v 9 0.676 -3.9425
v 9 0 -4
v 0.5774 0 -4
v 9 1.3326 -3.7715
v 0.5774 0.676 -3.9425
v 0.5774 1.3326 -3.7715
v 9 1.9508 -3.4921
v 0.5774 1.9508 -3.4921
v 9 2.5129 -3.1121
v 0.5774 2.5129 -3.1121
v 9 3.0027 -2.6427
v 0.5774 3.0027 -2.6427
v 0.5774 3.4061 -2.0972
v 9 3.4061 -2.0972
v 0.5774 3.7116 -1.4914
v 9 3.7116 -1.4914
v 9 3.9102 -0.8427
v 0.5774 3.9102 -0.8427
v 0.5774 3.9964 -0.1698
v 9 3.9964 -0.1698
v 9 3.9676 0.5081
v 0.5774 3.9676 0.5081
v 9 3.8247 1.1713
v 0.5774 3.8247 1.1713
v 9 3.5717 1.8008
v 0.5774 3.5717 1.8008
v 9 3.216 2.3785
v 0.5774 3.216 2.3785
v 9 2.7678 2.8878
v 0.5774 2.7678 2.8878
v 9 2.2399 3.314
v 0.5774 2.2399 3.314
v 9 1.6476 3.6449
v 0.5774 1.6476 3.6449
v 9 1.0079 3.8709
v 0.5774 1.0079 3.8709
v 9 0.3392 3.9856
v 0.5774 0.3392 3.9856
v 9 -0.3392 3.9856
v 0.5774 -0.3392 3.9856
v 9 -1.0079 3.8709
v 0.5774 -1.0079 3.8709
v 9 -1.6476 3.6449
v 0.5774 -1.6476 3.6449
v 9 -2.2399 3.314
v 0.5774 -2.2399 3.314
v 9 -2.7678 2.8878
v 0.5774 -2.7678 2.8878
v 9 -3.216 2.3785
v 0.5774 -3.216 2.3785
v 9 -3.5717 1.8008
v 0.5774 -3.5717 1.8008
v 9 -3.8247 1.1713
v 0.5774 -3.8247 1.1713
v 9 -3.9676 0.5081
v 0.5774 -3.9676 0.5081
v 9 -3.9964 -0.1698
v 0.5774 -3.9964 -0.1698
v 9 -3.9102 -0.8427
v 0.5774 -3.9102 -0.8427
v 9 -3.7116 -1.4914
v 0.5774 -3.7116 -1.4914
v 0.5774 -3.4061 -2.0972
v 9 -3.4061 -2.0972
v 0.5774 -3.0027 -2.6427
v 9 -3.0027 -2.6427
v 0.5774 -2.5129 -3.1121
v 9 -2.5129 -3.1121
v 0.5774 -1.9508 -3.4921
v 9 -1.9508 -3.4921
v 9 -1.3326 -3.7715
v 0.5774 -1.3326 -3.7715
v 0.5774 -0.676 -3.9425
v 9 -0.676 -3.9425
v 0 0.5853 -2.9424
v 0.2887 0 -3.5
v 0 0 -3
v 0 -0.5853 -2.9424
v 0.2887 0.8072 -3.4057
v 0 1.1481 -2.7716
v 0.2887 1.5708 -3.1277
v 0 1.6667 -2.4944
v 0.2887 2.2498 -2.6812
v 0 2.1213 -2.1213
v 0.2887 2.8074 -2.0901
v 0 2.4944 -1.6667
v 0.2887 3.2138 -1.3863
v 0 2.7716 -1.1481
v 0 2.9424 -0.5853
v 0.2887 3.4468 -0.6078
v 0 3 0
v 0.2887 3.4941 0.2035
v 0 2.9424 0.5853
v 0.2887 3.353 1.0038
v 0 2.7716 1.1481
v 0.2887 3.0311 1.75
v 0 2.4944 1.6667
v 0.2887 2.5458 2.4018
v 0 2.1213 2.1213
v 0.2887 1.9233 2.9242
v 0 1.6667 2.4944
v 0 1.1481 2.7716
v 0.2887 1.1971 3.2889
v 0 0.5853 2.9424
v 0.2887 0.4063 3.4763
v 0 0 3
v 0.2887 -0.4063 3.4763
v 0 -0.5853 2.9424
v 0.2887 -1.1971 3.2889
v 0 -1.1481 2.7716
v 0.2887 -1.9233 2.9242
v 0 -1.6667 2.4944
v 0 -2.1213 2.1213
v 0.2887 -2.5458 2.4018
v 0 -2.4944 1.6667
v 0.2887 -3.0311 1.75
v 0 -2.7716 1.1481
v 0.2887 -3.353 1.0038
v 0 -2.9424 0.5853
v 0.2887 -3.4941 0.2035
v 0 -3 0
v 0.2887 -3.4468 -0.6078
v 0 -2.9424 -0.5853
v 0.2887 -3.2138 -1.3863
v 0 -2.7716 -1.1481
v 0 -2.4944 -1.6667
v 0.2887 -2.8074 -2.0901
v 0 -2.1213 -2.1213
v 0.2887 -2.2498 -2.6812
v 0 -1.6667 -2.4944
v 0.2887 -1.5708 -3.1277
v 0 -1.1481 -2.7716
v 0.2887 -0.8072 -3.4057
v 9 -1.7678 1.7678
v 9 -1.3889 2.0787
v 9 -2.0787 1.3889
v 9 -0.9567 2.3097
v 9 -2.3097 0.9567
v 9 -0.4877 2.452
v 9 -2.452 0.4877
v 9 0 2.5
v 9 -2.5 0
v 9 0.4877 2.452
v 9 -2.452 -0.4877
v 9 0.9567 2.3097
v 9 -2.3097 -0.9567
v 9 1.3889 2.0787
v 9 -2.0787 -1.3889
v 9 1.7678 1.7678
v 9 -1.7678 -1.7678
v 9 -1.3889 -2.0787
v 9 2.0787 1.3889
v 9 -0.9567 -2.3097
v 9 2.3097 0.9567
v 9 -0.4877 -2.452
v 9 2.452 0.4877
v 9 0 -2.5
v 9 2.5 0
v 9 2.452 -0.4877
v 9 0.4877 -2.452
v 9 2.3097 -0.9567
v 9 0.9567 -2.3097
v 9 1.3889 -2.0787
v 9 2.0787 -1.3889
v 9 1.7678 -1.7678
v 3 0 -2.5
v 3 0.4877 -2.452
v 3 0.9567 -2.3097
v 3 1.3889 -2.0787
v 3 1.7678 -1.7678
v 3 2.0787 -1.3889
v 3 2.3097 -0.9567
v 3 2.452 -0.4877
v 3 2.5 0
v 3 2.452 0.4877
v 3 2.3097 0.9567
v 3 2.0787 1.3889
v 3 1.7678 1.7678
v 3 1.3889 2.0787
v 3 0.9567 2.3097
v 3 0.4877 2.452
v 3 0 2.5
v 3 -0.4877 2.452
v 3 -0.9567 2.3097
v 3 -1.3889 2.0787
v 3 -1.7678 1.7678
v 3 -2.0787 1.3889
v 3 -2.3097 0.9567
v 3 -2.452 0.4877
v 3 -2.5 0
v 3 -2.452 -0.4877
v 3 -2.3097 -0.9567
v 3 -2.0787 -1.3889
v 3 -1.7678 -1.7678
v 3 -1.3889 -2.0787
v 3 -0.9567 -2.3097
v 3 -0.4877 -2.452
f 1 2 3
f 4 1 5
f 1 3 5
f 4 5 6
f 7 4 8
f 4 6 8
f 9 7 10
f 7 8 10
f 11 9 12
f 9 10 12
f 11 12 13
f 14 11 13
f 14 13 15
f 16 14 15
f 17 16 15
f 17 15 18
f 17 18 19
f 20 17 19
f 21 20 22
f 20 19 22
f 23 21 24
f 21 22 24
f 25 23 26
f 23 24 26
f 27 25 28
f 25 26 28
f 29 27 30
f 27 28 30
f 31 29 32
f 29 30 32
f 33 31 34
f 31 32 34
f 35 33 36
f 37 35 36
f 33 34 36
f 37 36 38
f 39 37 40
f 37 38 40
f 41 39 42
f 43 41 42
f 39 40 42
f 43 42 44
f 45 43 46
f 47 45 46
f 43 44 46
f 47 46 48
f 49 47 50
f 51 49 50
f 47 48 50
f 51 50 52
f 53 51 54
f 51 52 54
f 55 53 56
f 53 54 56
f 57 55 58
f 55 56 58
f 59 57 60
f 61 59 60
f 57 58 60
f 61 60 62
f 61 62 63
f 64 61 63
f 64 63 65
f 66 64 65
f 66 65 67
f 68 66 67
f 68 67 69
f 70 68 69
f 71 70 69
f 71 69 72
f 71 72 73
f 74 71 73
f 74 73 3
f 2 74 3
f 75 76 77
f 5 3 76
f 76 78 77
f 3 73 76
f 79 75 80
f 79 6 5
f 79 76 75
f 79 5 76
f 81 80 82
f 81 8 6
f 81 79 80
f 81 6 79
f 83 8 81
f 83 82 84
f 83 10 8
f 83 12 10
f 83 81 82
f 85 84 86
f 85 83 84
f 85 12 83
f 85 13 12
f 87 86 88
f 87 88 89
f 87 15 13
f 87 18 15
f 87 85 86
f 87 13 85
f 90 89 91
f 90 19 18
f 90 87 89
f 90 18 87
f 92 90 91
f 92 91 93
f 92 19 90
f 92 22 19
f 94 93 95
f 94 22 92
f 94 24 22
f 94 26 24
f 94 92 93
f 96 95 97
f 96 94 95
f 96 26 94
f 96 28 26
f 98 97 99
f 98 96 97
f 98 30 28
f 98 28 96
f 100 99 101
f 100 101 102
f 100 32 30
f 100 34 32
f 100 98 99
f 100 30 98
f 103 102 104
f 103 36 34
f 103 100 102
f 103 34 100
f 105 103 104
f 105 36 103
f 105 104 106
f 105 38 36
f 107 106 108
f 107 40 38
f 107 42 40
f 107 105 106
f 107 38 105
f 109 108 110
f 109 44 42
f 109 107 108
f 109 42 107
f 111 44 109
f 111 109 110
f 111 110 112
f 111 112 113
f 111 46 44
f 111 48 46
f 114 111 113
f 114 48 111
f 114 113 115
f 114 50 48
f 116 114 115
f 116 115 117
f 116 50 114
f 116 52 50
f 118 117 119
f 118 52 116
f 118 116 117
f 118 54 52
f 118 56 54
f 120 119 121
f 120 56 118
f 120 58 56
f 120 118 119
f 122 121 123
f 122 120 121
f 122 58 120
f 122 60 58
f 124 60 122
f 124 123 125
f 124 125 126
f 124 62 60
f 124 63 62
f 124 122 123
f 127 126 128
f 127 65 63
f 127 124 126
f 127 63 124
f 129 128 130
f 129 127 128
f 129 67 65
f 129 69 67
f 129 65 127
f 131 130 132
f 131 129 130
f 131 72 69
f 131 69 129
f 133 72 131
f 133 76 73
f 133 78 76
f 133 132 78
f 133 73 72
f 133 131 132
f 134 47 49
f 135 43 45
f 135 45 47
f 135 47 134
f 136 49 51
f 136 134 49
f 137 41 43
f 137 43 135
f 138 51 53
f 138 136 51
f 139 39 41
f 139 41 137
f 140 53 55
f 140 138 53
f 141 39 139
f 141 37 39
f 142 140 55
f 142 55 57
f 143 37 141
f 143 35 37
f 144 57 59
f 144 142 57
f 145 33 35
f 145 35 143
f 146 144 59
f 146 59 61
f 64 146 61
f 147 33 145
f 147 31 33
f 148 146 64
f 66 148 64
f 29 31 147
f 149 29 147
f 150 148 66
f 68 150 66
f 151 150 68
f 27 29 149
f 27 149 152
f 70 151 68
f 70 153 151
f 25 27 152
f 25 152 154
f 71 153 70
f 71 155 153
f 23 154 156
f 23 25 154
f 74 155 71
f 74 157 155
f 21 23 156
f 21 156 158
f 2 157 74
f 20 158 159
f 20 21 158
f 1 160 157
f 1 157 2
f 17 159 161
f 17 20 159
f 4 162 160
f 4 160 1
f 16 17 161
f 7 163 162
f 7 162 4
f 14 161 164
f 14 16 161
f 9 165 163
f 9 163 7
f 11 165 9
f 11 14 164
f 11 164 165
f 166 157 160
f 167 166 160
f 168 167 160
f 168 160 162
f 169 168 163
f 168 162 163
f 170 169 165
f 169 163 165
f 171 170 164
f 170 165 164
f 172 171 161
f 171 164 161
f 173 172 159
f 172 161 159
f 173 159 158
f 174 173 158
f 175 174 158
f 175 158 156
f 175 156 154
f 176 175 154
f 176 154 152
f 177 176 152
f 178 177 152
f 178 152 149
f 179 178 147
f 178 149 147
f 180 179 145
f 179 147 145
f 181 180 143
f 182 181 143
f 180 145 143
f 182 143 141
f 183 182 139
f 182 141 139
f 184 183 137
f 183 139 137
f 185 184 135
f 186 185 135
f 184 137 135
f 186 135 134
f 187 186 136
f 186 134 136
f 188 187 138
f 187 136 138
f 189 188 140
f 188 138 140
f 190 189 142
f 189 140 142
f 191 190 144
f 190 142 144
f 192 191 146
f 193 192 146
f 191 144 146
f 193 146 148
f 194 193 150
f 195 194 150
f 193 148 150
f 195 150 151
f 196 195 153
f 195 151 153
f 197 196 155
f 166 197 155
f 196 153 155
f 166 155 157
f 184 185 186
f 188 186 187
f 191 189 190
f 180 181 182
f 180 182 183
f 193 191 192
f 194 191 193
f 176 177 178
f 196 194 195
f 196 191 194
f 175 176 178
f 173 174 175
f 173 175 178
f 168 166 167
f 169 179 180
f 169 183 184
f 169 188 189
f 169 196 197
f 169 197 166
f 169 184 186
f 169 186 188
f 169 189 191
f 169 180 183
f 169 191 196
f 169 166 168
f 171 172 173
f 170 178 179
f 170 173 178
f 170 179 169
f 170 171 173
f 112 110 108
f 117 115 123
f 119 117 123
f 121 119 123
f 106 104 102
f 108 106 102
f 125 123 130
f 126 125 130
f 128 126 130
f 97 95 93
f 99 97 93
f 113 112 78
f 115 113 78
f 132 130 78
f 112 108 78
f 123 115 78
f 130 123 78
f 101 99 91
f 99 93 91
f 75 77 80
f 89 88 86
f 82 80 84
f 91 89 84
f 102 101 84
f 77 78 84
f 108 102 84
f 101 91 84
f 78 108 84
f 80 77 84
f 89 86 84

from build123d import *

# Parameters (mm, degrees)
SKETCH1_R           = 4
BOSS_EXTRUDE1_DEPTH = 9
CHAMFER1_SIZE       = 1
CHAMFER1_SIZE2      = 0.577350269
SKETCH2_R           = 2.5
CUT_EXTRUDE1_DEPTH  = 6


with BuildPart() as part:
    # Sketch1 → Boss-Extrude1 (new body)
    with BuildSketch(Plane(origin=(0, 0, 0), x_dir=(0, 0, -1), z_dir=(1, 0, 0))):
        Circle(SKETCH1_R)
    extrude(amount=BOSS_EXTRUDE1_DEPTH)

    # Chamfer1
    chamfer1_edges = [part.edges().sort_by_distance(p)[0] for p in [
        (0, 0, 4),
    ]]
    chamfer1_side = [part.faces().sort_by_distance(p)[0] for p in [
        (0, 0, 0),
    ]]
    chamfer(chamfer1_edges, length=CHAMFER1_SIZE, length2=CHAMFER1_SIZE2, reference=chamfer1_side[0])

    # Sketch2 → Cut-Extrude1 (cut)
    with BuildSketch(Plane(origin=(9, 0, 0), x_dir=(0, 0, -1), z_dir=(1, 0, 0))):
        Circle(SKETCH2_R)
    extrude(amount=-CUT_EXTRUDE1_DEPTH, mode=Mode.SUBTRACT)


solid = part.part
